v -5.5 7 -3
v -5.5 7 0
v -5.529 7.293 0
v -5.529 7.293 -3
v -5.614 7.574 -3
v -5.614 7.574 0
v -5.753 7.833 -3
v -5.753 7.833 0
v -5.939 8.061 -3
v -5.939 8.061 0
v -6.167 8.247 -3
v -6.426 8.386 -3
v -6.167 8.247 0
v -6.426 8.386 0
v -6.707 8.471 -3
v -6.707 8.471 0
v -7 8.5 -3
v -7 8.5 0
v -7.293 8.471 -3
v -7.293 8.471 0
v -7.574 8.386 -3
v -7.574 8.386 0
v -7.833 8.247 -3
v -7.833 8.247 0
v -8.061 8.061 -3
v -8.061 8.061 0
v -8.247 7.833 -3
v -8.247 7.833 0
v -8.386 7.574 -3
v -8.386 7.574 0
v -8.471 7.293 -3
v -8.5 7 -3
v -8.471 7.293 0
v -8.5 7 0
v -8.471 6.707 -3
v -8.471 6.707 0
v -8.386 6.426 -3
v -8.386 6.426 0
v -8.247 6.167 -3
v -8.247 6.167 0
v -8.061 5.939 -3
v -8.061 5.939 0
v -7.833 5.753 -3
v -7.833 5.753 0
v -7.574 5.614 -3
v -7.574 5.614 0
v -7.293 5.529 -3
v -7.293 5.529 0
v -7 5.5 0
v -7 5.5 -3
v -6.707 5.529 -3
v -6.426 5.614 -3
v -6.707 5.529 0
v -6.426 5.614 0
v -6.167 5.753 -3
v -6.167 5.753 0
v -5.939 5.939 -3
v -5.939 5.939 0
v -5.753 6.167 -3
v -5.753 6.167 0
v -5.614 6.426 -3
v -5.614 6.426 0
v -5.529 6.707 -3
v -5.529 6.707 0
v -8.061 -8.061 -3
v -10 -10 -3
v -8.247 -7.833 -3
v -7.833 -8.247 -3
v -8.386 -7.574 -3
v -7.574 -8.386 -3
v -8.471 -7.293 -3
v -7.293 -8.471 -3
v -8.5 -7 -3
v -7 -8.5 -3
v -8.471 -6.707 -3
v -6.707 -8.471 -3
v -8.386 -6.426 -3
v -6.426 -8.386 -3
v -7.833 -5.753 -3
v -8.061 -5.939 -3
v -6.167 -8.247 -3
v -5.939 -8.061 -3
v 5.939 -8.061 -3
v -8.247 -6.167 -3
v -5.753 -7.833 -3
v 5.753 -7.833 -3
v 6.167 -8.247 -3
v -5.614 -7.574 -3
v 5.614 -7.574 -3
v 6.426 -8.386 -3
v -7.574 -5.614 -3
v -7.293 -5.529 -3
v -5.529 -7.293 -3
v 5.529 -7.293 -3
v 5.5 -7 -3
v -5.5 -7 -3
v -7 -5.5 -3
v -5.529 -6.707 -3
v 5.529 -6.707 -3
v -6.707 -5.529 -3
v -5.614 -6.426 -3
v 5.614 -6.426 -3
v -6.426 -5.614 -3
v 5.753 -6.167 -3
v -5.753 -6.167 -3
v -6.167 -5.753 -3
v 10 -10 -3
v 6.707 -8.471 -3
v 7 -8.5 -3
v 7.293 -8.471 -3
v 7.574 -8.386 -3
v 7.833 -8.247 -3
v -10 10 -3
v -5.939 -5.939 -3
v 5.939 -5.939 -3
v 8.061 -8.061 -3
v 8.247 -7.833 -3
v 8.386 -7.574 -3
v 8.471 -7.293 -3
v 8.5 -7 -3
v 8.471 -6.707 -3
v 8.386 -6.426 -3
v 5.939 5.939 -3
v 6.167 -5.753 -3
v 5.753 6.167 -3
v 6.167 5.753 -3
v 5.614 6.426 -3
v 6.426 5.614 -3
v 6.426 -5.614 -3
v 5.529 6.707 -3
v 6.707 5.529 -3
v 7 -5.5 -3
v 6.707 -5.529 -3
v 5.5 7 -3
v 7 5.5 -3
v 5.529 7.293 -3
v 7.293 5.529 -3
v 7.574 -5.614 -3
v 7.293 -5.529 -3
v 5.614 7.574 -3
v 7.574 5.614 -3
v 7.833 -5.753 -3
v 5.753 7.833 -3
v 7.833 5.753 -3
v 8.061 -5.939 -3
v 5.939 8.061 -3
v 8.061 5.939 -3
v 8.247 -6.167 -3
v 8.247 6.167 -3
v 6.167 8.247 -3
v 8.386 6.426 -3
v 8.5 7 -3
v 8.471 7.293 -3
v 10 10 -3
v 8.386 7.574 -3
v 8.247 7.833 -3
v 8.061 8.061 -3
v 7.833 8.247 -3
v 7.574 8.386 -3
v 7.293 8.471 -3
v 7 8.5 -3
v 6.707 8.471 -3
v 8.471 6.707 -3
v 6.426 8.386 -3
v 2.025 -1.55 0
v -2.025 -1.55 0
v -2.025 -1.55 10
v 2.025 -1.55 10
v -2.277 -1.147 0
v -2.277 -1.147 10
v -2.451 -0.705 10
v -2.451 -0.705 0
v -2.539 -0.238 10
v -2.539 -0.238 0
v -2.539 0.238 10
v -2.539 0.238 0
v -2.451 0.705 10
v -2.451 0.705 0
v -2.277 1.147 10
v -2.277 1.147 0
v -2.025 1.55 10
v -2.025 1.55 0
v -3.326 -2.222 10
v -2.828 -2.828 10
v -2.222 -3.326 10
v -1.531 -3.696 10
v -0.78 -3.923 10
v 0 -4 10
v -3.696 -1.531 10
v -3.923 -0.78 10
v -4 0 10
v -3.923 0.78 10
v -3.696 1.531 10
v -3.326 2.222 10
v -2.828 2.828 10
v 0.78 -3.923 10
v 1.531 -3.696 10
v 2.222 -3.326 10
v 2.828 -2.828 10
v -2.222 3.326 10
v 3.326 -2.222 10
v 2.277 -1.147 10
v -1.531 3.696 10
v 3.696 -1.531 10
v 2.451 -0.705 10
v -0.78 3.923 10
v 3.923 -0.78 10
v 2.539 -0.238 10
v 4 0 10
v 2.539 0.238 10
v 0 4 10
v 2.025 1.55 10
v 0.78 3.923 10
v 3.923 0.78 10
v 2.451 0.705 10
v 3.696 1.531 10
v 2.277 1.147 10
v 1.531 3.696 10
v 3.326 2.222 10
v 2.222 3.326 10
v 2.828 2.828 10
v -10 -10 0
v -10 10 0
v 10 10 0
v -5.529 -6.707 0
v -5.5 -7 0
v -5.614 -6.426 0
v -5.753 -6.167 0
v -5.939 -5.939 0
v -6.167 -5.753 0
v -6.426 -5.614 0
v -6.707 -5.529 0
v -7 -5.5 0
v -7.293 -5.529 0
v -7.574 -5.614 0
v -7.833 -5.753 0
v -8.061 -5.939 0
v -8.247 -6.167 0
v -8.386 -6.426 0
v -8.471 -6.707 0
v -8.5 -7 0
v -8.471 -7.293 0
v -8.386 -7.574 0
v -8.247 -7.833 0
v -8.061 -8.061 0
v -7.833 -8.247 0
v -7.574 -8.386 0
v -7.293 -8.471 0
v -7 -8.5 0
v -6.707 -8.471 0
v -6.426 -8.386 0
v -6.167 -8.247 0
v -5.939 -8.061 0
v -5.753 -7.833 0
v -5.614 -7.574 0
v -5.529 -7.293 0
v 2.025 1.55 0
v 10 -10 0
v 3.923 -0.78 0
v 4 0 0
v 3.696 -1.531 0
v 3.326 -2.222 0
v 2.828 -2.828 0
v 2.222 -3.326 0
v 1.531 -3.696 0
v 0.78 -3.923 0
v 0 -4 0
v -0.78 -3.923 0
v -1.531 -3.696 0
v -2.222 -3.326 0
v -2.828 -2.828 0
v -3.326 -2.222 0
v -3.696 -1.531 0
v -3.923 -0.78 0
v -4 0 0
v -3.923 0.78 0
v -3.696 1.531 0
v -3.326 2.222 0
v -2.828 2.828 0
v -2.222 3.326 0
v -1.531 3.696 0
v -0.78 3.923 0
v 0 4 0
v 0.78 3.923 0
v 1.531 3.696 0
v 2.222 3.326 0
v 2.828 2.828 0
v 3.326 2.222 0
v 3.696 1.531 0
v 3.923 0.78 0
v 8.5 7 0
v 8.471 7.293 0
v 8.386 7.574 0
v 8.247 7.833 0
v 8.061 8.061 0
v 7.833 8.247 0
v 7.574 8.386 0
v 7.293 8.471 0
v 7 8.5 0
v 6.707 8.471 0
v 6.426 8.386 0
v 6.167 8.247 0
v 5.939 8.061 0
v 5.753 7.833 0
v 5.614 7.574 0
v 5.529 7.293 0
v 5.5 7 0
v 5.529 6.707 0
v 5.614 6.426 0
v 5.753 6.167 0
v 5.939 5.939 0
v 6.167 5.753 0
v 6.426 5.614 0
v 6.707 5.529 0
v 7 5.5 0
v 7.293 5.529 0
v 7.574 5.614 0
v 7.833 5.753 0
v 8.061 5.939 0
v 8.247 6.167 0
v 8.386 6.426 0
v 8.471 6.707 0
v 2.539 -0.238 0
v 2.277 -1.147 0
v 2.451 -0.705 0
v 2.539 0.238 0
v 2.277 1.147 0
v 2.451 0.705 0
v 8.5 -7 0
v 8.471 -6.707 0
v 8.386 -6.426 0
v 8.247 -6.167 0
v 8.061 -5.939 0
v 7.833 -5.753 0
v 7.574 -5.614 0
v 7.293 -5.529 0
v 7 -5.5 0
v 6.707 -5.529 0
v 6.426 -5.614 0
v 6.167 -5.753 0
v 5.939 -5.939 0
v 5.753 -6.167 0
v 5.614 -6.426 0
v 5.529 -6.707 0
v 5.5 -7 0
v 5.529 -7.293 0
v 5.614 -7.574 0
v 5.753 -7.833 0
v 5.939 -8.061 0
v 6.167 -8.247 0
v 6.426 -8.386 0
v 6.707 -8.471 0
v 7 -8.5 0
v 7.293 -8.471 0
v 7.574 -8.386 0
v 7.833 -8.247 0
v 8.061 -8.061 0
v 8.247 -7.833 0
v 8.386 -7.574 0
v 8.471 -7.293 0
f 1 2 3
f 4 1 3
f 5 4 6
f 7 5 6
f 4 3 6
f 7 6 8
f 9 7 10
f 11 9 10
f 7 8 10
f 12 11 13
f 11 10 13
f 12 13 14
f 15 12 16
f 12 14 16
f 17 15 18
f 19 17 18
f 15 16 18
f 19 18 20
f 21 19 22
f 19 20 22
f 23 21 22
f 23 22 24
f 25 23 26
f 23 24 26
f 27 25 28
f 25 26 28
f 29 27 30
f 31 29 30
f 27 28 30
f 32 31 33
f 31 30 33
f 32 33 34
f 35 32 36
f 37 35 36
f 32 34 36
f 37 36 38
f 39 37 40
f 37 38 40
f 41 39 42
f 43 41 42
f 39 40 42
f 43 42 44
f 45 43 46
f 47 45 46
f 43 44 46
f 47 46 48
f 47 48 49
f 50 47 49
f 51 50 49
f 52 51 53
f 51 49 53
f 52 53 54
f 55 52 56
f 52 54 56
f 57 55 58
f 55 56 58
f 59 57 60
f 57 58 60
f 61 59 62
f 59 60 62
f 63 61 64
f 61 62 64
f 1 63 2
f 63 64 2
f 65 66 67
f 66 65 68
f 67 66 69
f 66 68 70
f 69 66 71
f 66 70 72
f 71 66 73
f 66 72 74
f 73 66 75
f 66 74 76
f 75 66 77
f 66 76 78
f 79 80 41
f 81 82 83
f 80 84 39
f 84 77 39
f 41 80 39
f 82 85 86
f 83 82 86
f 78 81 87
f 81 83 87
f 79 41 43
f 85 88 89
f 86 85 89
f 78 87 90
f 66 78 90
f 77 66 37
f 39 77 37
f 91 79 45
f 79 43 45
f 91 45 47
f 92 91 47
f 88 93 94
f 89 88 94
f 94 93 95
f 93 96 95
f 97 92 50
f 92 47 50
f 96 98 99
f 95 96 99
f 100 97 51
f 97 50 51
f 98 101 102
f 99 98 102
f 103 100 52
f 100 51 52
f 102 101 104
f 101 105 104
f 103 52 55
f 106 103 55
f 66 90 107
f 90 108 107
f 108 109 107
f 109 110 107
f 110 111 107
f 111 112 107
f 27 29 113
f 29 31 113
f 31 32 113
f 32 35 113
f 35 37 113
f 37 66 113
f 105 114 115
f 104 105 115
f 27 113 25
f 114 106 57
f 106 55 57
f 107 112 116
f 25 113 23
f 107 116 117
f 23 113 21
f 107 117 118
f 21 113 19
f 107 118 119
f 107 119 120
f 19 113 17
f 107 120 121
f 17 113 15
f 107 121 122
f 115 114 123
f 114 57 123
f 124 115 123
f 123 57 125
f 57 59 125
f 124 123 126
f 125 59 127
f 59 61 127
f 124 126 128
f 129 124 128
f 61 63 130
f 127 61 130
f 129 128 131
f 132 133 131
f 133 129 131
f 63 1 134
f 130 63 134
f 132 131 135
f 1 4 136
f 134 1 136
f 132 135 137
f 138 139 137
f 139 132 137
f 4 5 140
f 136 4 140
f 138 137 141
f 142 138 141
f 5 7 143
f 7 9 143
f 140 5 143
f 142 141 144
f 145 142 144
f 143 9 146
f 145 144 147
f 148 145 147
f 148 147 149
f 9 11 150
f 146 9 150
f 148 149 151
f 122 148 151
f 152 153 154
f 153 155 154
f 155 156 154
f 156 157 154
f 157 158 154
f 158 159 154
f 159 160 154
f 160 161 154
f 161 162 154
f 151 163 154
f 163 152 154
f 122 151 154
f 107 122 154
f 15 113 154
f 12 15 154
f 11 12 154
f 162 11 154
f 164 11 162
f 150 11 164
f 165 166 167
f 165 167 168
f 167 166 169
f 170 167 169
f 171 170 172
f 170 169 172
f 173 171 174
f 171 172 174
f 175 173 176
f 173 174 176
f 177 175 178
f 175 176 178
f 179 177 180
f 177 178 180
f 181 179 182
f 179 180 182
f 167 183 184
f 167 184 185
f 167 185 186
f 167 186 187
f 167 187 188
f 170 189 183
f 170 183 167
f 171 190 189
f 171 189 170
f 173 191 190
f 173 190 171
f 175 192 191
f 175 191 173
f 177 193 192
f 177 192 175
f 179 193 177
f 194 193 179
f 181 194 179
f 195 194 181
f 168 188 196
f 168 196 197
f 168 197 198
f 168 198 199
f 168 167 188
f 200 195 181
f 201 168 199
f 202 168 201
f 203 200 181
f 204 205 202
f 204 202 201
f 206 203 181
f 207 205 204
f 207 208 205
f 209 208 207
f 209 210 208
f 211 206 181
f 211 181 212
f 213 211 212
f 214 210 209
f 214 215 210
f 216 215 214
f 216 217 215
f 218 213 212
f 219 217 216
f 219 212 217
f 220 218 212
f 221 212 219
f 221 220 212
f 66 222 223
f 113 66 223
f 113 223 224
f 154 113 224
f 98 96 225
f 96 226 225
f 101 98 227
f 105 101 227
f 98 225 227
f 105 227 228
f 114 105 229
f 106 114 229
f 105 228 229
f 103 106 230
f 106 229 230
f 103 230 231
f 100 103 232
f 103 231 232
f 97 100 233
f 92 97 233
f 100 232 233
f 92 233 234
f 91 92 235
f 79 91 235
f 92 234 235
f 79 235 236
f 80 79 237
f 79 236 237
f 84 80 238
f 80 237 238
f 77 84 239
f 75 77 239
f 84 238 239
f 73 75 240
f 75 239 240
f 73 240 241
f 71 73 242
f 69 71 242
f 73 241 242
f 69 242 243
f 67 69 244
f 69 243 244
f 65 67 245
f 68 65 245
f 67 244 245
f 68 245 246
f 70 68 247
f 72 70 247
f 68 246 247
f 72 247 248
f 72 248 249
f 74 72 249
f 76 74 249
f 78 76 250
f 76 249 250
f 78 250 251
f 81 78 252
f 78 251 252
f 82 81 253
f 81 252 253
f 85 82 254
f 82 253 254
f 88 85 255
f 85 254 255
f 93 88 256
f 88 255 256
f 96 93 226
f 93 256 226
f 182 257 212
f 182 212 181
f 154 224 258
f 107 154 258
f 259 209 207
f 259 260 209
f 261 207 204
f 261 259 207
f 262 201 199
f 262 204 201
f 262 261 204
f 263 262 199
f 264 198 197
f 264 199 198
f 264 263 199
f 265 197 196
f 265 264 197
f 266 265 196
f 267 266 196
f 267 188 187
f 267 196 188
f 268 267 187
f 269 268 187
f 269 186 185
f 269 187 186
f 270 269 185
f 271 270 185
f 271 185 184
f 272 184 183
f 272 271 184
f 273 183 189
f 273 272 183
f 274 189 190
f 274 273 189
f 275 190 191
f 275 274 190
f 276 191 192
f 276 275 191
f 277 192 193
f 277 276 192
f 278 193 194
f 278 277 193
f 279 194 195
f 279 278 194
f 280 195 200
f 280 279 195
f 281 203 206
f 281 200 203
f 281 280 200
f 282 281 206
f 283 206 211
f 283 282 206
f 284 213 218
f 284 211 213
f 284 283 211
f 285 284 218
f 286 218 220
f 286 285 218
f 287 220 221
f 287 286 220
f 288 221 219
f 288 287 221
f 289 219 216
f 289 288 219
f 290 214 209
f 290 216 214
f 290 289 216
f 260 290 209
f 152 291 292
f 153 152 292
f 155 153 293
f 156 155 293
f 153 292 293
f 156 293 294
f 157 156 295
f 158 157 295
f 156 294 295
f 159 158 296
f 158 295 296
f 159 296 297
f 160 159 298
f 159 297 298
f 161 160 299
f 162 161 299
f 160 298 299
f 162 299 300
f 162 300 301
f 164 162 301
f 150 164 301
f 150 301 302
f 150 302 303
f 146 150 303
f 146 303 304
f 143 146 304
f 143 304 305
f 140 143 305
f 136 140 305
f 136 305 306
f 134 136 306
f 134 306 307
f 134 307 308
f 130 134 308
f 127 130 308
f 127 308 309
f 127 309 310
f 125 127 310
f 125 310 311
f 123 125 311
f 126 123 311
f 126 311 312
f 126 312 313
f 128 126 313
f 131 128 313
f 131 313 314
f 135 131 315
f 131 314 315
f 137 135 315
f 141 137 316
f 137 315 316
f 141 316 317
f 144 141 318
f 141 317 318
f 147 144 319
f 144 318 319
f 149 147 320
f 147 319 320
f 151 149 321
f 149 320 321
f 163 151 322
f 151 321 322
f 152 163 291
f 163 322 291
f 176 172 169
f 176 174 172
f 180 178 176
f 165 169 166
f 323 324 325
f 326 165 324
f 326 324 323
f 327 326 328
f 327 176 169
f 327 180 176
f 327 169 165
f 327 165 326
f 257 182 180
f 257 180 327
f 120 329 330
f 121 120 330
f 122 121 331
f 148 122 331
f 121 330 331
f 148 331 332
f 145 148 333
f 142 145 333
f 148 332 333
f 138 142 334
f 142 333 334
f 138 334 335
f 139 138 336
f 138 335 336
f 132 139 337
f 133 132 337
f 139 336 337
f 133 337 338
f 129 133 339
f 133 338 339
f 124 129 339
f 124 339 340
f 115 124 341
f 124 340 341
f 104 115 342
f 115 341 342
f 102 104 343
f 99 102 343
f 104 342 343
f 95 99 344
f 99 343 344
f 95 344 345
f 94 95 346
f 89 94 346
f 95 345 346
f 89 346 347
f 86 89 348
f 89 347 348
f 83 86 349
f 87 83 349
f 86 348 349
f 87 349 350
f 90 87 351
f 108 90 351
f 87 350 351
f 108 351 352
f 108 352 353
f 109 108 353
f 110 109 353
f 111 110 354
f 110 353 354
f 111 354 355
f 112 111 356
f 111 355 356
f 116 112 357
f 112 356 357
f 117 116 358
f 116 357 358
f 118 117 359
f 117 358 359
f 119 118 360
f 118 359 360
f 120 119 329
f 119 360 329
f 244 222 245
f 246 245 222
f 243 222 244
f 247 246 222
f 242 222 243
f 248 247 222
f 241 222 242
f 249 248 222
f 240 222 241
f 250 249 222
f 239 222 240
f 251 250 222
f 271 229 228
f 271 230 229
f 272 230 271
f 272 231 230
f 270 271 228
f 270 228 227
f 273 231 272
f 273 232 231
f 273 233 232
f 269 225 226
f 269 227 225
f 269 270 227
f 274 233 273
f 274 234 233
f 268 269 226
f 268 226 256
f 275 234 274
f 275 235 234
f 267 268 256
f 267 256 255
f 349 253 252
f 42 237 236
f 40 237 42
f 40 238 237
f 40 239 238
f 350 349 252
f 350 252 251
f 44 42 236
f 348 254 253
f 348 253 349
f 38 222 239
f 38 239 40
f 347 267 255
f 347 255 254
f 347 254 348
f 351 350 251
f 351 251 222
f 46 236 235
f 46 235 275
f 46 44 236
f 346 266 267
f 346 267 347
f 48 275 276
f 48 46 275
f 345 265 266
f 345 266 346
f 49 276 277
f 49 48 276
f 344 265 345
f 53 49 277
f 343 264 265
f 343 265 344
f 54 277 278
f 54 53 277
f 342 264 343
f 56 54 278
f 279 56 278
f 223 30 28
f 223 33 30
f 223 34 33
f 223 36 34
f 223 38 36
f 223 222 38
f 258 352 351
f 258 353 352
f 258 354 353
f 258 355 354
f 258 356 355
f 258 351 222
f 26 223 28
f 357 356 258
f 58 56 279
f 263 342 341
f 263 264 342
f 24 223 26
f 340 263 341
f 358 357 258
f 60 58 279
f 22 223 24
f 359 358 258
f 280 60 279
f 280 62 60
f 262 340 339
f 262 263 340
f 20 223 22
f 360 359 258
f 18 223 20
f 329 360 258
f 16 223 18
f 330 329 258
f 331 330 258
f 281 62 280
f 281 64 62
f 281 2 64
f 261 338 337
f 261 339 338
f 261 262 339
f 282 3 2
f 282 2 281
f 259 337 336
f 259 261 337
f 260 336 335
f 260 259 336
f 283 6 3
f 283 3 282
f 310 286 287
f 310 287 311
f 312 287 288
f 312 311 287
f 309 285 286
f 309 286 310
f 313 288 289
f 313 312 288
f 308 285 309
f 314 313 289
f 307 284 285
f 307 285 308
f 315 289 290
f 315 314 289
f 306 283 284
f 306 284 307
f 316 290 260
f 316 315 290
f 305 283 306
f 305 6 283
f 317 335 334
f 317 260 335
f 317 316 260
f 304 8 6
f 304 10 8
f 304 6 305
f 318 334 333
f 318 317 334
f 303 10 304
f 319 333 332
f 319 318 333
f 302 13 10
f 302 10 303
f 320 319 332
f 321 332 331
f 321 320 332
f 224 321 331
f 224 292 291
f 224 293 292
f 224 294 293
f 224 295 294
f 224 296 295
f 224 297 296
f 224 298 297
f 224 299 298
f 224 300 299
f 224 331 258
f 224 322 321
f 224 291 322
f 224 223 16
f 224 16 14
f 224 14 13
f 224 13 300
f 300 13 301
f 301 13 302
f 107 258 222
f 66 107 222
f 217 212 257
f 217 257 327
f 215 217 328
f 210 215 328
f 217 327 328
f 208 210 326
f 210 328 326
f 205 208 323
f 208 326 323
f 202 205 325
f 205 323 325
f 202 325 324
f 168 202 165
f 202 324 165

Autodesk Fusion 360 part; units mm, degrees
sketch "Sketch1" plane through (0, 0, 0) normal (0, 0, 1) x (1, 0, 0)
  line L0 (2.55, 1.55) -> (-2.55, -1.55) construction
  line L1 (2.55, 1.55) -> (-2.55, -1.55) construction
  line L2 (-2.55, 1.55) -> (-2.55, -1.55)
  circle A0 centre (0, 0) radius 4
  line L3 (-2.55, 1.55) -> (2.55, -1.55) construction
  line L4 (-2.55, -1.55) -> (2.55, -1.55)
  line L5 (2.55, 1.55) -> (-2.55, 1.55)
  line L6 (2.55, 1.55) -> (-2.55, -1.55) construction
  line L7 (-2.55, 1.55) -> (2.55, -1.55) construction
  line L8 (-2.55, 1.55) -> (2.55, -1.55) construction
  circle A1 centre (0, 0) radius 2.55
  line L9 (2.55, -1.55) -> (2.55, 1.55)
  line L10 (-10, 10) -> (10, 10)
  line L11 (10, 10) -> (10, -10)
  line L12 (10, -10) -> (-10, -10)
  line L13 (-10, -10) -> (-10, 10)
  circle A2 centre (-7, 7) radius 1.5
  line L14 (0, 10) -> (0, 7.5)
  circle A3 centre (7, 7) radius 1.5
  line L15 (-10, 0) -> (-8.5, 0)
  circle A4 centre (-7, -7) radius 1.5
  circle A5 centre (7, -7) radius 1.5
  dimension "d1" = 5.1
  dimension "d2" = 5.1
  dimension "d3" = 3.1
  dimension "d4" = 8
  dimension "d5" = 5.1
  dimension "d6" = 5.1
  dimension "d7" = 20
  dimension "d8" = 20
  dimension "d9" = 3
extrude "Extrude1" add sketch "Sketch1" along normal blind 10 contours L2 L5 A1 | L2 L4 A1 | L5 A1 | L4 A1 | L5 A1 L9 | L4 A1 L9 | A0 makes body 1
extrude "Extrude2" add sketch "Sketch1" against normal blind 3 separate body contours L10 L11 L12 L13 makes body 2
extrude "Extrude3" add sketch "Sketch1" against normal blind 3 contours L2 L5 A1 | L2 L4 A1 | L4 L5 A1 | L5 A1 | L4 A1 | L5 A1 L9 | L4 A1 L9 | A0 bodies 1 2
